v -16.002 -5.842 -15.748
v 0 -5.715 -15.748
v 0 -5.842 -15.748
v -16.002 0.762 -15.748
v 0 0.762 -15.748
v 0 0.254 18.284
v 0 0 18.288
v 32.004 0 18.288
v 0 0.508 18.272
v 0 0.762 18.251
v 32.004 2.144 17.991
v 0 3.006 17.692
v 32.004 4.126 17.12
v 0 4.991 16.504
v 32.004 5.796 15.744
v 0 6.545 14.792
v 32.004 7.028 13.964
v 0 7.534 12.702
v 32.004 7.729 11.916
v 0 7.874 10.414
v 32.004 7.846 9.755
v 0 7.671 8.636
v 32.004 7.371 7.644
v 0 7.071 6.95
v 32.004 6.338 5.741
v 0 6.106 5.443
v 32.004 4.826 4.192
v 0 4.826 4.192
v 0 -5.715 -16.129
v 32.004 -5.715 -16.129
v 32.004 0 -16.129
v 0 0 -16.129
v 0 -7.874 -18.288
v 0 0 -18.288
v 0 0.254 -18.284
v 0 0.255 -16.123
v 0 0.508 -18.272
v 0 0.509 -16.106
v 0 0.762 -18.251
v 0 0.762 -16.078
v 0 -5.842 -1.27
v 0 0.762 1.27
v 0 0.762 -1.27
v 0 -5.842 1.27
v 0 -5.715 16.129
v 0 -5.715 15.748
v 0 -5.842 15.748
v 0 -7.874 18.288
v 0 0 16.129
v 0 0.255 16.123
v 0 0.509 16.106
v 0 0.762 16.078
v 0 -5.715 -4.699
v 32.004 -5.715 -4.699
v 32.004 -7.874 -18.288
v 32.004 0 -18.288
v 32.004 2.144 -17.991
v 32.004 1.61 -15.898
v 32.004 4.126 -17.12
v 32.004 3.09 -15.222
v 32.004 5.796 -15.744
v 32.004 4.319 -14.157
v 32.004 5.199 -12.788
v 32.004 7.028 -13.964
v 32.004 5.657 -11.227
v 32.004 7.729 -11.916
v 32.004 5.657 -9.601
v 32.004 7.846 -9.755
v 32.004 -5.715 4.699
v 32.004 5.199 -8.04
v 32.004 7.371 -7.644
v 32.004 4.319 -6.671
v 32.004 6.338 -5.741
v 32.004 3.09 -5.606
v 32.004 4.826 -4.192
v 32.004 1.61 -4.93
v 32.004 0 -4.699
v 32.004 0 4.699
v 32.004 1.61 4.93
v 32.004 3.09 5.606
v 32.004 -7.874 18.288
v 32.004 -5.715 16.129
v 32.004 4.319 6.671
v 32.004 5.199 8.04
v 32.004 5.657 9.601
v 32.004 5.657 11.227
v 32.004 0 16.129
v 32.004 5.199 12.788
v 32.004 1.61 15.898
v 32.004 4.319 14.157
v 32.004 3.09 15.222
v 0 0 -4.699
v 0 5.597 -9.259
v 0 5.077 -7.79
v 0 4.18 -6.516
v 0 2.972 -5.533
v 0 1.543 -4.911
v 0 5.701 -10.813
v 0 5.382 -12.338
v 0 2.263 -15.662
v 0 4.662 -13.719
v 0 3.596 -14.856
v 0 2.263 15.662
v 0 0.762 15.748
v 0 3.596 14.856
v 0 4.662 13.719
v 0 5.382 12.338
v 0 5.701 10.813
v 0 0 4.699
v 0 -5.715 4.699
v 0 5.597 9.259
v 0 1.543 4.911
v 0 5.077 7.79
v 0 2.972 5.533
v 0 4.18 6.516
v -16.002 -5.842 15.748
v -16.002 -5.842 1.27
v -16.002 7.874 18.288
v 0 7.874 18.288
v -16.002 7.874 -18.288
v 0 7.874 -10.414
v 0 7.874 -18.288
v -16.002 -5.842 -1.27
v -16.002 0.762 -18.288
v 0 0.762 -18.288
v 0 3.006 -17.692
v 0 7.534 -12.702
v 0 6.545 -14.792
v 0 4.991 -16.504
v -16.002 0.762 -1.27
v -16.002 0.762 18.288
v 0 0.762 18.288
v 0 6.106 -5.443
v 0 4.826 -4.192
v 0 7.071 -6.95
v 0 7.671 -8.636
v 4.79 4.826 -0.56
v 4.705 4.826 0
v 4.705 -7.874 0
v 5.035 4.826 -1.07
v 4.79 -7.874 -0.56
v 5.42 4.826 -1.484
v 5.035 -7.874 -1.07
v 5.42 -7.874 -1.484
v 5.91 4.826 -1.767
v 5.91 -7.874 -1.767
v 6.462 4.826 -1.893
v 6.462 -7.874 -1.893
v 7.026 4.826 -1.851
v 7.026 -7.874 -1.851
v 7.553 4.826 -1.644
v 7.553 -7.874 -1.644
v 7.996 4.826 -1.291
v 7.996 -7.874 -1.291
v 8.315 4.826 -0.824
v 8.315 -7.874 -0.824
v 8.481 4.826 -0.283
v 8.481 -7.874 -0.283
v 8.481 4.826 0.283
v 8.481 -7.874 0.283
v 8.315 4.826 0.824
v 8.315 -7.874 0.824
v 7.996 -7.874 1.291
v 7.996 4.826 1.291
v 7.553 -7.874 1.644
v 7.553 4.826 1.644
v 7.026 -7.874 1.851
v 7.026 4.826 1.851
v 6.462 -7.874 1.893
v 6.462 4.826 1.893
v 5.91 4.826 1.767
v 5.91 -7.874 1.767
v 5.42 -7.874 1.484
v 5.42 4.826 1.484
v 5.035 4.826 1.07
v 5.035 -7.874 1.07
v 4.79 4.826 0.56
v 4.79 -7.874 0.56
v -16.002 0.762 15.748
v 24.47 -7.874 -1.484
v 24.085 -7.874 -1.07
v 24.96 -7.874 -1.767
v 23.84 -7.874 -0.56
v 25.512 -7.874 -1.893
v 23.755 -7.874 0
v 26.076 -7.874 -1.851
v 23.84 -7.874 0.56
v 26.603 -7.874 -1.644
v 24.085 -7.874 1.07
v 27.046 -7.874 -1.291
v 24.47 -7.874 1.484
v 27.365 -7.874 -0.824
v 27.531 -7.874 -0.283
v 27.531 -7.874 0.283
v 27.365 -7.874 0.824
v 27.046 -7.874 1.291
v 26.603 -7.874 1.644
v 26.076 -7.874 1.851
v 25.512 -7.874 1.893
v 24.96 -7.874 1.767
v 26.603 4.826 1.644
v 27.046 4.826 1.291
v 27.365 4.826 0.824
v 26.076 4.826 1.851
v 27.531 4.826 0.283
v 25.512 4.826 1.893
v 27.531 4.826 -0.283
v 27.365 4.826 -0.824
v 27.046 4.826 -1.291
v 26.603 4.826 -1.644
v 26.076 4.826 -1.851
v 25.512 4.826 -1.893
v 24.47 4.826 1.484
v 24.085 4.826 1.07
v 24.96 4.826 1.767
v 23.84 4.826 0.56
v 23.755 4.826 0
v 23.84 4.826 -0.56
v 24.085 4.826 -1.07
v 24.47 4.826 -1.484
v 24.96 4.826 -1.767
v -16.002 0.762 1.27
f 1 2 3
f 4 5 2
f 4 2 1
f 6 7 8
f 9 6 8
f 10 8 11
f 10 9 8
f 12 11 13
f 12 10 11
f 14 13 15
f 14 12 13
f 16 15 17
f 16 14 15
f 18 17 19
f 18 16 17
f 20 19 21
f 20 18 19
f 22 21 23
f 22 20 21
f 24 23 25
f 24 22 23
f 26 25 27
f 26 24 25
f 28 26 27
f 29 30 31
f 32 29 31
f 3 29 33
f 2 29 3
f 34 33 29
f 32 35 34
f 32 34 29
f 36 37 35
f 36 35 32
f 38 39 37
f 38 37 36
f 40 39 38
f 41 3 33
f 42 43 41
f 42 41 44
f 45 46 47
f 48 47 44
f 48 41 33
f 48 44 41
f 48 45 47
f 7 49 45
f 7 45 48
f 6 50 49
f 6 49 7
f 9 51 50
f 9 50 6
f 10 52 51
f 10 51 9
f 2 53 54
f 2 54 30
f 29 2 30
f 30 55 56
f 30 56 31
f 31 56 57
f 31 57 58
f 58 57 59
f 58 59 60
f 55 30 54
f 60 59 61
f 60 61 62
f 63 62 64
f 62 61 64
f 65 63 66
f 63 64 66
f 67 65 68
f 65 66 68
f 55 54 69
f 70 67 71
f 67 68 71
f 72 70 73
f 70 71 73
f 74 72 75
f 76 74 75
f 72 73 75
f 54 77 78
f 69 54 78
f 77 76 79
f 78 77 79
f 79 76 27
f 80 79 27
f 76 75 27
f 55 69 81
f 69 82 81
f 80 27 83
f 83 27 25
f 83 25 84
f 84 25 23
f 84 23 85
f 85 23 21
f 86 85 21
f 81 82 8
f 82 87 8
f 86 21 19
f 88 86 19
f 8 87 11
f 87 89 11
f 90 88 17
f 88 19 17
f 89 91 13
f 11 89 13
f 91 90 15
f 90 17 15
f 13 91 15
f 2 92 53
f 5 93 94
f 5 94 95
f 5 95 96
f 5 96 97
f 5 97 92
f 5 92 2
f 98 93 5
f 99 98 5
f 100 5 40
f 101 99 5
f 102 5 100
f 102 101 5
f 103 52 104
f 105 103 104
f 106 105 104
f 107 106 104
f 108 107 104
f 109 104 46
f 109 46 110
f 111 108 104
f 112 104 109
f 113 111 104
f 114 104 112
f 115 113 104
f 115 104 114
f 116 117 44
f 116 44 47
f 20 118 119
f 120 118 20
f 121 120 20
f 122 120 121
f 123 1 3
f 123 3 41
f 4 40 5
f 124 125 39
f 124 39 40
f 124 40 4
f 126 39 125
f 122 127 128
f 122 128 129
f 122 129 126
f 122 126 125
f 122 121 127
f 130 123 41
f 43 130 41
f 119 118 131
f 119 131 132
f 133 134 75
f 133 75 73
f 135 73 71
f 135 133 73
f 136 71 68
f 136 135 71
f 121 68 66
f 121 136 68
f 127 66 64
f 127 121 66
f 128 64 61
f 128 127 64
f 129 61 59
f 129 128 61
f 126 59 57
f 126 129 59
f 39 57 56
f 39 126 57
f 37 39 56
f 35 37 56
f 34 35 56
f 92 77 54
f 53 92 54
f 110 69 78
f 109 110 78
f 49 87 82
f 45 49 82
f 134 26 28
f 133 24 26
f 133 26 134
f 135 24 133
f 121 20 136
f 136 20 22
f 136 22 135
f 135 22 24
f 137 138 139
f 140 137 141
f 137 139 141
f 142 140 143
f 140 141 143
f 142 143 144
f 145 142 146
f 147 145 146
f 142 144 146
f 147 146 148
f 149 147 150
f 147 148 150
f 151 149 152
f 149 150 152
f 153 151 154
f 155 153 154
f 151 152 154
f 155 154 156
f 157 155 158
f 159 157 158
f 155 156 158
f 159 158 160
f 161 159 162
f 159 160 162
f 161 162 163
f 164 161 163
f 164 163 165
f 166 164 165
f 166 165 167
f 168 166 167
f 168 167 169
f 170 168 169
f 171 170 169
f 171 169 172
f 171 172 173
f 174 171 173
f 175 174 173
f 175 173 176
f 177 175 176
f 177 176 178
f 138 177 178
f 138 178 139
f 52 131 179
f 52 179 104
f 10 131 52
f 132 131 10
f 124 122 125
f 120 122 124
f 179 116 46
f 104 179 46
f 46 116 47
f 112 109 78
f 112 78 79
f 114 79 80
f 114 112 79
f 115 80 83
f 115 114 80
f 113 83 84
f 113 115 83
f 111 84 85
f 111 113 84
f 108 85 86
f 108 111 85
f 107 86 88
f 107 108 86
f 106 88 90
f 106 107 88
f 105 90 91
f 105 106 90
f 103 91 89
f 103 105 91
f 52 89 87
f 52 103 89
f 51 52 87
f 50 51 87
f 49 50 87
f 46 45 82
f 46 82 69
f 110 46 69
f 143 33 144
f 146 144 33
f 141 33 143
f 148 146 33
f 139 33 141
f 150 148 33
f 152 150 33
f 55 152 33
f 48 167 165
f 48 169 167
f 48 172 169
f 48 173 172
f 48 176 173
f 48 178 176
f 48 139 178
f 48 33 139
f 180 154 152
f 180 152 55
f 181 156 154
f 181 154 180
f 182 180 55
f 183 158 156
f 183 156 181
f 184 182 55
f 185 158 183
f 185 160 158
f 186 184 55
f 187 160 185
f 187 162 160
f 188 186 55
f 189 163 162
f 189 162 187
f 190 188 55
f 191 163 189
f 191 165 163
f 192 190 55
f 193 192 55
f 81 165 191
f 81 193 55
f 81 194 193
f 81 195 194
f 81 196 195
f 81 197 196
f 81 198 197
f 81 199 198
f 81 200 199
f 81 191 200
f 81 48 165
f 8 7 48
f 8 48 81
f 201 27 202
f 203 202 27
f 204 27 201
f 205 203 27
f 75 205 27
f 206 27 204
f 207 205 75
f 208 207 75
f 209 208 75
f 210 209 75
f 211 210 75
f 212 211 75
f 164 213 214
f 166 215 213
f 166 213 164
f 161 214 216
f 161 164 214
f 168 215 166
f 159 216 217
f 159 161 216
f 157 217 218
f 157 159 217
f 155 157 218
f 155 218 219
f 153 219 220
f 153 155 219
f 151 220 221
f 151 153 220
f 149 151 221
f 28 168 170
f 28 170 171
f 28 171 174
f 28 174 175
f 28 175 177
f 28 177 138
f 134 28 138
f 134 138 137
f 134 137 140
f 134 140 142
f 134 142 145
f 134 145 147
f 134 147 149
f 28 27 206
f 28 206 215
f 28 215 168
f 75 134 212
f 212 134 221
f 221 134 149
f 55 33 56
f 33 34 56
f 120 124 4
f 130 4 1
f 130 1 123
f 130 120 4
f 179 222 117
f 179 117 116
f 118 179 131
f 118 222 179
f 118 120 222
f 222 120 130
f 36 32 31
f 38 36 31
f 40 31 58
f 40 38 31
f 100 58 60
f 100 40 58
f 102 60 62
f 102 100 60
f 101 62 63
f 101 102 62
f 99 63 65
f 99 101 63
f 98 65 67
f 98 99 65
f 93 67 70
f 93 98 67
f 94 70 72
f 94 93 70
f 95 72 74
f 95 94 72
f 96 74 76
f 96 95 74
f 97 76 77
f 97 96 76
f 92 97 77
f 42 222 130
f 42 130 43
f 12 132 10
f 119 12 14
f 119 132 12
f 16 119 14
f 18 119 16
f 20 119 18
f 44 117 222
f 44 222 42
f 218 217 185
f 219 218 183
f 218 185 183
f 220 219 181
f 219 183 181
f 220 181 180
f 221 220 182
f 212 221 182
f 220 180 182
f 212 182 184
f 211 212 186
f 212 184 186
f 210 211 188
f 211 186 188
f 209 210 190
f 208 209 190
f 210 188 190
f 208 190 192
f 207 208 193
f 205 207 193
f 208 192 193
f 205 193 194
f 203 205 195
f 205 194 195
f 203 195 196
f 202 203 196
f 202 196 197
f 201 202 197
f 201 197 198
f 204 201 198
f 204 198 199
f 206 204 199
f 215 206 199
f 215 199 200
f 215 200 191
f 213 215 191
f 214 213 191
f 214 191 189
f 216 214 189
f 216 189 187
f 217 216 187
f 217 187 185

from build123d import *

# Parameters (mm, degrees)
SKETCH1_W              = 16.002
SKETCH1_H              = 36.576
BOSS_EXTRUDE1_DEPTH    = 7.112
BOSS_EXTRUDE2_DEPTH    = 6.604
SKETCH3_W              = 16.002
SKETCH3_H              = 6.604
CUT_EXTRUDE1_DEPTH     = 2.54
SKETCH4_W              = 16.002
SKETCH4_H              = 2.54
CUT_EXTRUDE2_DEPTH     = 6.604
BOSS_EXTRUDE3_DEPTH    = 32.004
SKETCH6_W              = 32.004
SKETCH6_H              = 36.576
BOSS_EXTRUDE4_DEPTH    = 2.032
SKETCH7_W              = 16.002
SKETCH7_H              = 2.54
CUT_EXTRUDE3_DEPTH     = 6.604
M3_5_CLEARANCE_HOLE1_D = 3.7973


with BuildPart() as part:
    # Sketch1 → Boss-Extrude1 (new body)
    with BuildSketch(Plane(origin=(0, 7.874, 0), x_dir=(1, 0, 0), z_dir=(0, 1, 0))):
        with Locations((-8.001, 0)):
            Rectangle(SKETCH1_W, SKETCH1_H)
    extrude(amount=-BOSS_EXTRUDE1_DEPTH)

    # Sketch2 → Boss-Extrude2 (add)
    with BuildSketch(Plane.XZ.offset(-0.762)):
        with BuildLine():
            Line((-16.002, -18.288), (-16.002, 18.288))
            Line((-16.002, 18.288), (0, 18.288))
            Line((0, 18.288), (0, -15.748))
            add(Edge.make_bspline(
                [(0, -18.288), (0, -17.441333333), (0, -16.594666667), (0, -15.748)],
                knots=[0, 0, 0, 0, 1, 1, 1, 1], degree=3))
            Line((0, -18.288), (-16.002, -18.288))
        make_face()
    extrude(amount=BOSS_EXTRUDE2_DEPTH)

    # Sketch3 → Cut-Extrude1 (cut)
    with BuildSketch(Plane(origin=(0, 0, -18.288), x_dir=(-1, 0, 0), z_dir=(0, 0, -1))):
        with Locations((8.001, -2.54)):
            Rectangle(SKETCH3_W, SKETCH3_H)
    extrude(amount=-CUT_EXTRUDE1_DEPTH, mode=Mode.SUBTRACT)

    # Sketch4 → Cut-Extrude2 (cut)
    with BuildSketch(Plane.XZ.offset(5.842)):
        with Locations((-8.001, 17.018)):
            Rectangle(SKETCH4_W, SKETCH4_H)
    extrude(amount=-CUT_EXTRUDE2_DEPTH, mode=Mode.SUBTRACT)

    # Sketch5 → Boss-Extrude3 (add)
    with BuildSketch(Plane(origin=(0, 0, 0), x_dir=(0, 0, -1), z_dir=(1, 0, 0))):
        with BuildLine():
            Line((-18.288, -5.842), (-18.288, 0))
            ThreePointArc((-18.288, 0), (-12.964507707, 7.449482293), (-4.192296053, 4.826))
            Line((-4.192296053, 4.826), (4.192296053, 4.826))
            ThreePointArc((4.192296053, 4.826), (12.964507707, 7.449482293), (18.288, 0))
            Line((18.288, 0), (18.288, -5.842))
            Line((18.288, -5.842), (-18.288, -5.842))
        make_face()
        with BuildLine():
            Line((4.699, 0), (4.699, -5.715))
            Line((4.699, -5.715), (16.129, -5.715))
            Line((16.129, -5.715), (16.129, 0))
            ThreePointArc((16.129, 0), (10.414, 5.715), (4.699, 0))
        make_face(mode=Mode.SUBTRACT)
        with BuildLine():
            Line((-16.129, 0), (-16.129, -5.715))
            Line((-16.129, -5.715), (-4.699, -5.715))
            Line((-4.699, -5.715), (-4.699, 0))
            ThreePointArc((-4.699, 0), (-10.414, 5.715), (-16.129, 0))
        make_face(mode=Mode.SUBTRACT)
    extrude(amount=BOSS_EXTRUDE3_DEPTH)

    # Sketch6 → Boss-Extrude4 (add)
    with BuildSketch(Plane.XZ.offset(5.842)):
        with Locations((16.002, 0)):
            Rectangle(SKETCH6_W, SKETCH6_H)
    extrude(amount=BOSS_EXTRUDE4_DEPTH)

    # Sketch7 → Cut-Extrude3 (cut)
    with BuildSketch(Plane.XZ.offset(5.842)):
        with Locations((-8.001, 0)):
            Rectangle(SKETCH7_W, SKETCH7_H)
    extrude(amount=-CUT_EXTRUDE3_DEPTH, mode=Mode.SUBTRACT)

    # M3.5 Clearance Hole1 (through all)
    with Locations(Plane(origin=(0, 4.826, 0), x_dir=(1, 0, 0), z_dir=(0, 1, 0))):
        with Locations((25.654, 0), (6.604, 0)):
            Hole(M3_5_CLEARANCE_HOLE1_D / 2)


solid = part.part
